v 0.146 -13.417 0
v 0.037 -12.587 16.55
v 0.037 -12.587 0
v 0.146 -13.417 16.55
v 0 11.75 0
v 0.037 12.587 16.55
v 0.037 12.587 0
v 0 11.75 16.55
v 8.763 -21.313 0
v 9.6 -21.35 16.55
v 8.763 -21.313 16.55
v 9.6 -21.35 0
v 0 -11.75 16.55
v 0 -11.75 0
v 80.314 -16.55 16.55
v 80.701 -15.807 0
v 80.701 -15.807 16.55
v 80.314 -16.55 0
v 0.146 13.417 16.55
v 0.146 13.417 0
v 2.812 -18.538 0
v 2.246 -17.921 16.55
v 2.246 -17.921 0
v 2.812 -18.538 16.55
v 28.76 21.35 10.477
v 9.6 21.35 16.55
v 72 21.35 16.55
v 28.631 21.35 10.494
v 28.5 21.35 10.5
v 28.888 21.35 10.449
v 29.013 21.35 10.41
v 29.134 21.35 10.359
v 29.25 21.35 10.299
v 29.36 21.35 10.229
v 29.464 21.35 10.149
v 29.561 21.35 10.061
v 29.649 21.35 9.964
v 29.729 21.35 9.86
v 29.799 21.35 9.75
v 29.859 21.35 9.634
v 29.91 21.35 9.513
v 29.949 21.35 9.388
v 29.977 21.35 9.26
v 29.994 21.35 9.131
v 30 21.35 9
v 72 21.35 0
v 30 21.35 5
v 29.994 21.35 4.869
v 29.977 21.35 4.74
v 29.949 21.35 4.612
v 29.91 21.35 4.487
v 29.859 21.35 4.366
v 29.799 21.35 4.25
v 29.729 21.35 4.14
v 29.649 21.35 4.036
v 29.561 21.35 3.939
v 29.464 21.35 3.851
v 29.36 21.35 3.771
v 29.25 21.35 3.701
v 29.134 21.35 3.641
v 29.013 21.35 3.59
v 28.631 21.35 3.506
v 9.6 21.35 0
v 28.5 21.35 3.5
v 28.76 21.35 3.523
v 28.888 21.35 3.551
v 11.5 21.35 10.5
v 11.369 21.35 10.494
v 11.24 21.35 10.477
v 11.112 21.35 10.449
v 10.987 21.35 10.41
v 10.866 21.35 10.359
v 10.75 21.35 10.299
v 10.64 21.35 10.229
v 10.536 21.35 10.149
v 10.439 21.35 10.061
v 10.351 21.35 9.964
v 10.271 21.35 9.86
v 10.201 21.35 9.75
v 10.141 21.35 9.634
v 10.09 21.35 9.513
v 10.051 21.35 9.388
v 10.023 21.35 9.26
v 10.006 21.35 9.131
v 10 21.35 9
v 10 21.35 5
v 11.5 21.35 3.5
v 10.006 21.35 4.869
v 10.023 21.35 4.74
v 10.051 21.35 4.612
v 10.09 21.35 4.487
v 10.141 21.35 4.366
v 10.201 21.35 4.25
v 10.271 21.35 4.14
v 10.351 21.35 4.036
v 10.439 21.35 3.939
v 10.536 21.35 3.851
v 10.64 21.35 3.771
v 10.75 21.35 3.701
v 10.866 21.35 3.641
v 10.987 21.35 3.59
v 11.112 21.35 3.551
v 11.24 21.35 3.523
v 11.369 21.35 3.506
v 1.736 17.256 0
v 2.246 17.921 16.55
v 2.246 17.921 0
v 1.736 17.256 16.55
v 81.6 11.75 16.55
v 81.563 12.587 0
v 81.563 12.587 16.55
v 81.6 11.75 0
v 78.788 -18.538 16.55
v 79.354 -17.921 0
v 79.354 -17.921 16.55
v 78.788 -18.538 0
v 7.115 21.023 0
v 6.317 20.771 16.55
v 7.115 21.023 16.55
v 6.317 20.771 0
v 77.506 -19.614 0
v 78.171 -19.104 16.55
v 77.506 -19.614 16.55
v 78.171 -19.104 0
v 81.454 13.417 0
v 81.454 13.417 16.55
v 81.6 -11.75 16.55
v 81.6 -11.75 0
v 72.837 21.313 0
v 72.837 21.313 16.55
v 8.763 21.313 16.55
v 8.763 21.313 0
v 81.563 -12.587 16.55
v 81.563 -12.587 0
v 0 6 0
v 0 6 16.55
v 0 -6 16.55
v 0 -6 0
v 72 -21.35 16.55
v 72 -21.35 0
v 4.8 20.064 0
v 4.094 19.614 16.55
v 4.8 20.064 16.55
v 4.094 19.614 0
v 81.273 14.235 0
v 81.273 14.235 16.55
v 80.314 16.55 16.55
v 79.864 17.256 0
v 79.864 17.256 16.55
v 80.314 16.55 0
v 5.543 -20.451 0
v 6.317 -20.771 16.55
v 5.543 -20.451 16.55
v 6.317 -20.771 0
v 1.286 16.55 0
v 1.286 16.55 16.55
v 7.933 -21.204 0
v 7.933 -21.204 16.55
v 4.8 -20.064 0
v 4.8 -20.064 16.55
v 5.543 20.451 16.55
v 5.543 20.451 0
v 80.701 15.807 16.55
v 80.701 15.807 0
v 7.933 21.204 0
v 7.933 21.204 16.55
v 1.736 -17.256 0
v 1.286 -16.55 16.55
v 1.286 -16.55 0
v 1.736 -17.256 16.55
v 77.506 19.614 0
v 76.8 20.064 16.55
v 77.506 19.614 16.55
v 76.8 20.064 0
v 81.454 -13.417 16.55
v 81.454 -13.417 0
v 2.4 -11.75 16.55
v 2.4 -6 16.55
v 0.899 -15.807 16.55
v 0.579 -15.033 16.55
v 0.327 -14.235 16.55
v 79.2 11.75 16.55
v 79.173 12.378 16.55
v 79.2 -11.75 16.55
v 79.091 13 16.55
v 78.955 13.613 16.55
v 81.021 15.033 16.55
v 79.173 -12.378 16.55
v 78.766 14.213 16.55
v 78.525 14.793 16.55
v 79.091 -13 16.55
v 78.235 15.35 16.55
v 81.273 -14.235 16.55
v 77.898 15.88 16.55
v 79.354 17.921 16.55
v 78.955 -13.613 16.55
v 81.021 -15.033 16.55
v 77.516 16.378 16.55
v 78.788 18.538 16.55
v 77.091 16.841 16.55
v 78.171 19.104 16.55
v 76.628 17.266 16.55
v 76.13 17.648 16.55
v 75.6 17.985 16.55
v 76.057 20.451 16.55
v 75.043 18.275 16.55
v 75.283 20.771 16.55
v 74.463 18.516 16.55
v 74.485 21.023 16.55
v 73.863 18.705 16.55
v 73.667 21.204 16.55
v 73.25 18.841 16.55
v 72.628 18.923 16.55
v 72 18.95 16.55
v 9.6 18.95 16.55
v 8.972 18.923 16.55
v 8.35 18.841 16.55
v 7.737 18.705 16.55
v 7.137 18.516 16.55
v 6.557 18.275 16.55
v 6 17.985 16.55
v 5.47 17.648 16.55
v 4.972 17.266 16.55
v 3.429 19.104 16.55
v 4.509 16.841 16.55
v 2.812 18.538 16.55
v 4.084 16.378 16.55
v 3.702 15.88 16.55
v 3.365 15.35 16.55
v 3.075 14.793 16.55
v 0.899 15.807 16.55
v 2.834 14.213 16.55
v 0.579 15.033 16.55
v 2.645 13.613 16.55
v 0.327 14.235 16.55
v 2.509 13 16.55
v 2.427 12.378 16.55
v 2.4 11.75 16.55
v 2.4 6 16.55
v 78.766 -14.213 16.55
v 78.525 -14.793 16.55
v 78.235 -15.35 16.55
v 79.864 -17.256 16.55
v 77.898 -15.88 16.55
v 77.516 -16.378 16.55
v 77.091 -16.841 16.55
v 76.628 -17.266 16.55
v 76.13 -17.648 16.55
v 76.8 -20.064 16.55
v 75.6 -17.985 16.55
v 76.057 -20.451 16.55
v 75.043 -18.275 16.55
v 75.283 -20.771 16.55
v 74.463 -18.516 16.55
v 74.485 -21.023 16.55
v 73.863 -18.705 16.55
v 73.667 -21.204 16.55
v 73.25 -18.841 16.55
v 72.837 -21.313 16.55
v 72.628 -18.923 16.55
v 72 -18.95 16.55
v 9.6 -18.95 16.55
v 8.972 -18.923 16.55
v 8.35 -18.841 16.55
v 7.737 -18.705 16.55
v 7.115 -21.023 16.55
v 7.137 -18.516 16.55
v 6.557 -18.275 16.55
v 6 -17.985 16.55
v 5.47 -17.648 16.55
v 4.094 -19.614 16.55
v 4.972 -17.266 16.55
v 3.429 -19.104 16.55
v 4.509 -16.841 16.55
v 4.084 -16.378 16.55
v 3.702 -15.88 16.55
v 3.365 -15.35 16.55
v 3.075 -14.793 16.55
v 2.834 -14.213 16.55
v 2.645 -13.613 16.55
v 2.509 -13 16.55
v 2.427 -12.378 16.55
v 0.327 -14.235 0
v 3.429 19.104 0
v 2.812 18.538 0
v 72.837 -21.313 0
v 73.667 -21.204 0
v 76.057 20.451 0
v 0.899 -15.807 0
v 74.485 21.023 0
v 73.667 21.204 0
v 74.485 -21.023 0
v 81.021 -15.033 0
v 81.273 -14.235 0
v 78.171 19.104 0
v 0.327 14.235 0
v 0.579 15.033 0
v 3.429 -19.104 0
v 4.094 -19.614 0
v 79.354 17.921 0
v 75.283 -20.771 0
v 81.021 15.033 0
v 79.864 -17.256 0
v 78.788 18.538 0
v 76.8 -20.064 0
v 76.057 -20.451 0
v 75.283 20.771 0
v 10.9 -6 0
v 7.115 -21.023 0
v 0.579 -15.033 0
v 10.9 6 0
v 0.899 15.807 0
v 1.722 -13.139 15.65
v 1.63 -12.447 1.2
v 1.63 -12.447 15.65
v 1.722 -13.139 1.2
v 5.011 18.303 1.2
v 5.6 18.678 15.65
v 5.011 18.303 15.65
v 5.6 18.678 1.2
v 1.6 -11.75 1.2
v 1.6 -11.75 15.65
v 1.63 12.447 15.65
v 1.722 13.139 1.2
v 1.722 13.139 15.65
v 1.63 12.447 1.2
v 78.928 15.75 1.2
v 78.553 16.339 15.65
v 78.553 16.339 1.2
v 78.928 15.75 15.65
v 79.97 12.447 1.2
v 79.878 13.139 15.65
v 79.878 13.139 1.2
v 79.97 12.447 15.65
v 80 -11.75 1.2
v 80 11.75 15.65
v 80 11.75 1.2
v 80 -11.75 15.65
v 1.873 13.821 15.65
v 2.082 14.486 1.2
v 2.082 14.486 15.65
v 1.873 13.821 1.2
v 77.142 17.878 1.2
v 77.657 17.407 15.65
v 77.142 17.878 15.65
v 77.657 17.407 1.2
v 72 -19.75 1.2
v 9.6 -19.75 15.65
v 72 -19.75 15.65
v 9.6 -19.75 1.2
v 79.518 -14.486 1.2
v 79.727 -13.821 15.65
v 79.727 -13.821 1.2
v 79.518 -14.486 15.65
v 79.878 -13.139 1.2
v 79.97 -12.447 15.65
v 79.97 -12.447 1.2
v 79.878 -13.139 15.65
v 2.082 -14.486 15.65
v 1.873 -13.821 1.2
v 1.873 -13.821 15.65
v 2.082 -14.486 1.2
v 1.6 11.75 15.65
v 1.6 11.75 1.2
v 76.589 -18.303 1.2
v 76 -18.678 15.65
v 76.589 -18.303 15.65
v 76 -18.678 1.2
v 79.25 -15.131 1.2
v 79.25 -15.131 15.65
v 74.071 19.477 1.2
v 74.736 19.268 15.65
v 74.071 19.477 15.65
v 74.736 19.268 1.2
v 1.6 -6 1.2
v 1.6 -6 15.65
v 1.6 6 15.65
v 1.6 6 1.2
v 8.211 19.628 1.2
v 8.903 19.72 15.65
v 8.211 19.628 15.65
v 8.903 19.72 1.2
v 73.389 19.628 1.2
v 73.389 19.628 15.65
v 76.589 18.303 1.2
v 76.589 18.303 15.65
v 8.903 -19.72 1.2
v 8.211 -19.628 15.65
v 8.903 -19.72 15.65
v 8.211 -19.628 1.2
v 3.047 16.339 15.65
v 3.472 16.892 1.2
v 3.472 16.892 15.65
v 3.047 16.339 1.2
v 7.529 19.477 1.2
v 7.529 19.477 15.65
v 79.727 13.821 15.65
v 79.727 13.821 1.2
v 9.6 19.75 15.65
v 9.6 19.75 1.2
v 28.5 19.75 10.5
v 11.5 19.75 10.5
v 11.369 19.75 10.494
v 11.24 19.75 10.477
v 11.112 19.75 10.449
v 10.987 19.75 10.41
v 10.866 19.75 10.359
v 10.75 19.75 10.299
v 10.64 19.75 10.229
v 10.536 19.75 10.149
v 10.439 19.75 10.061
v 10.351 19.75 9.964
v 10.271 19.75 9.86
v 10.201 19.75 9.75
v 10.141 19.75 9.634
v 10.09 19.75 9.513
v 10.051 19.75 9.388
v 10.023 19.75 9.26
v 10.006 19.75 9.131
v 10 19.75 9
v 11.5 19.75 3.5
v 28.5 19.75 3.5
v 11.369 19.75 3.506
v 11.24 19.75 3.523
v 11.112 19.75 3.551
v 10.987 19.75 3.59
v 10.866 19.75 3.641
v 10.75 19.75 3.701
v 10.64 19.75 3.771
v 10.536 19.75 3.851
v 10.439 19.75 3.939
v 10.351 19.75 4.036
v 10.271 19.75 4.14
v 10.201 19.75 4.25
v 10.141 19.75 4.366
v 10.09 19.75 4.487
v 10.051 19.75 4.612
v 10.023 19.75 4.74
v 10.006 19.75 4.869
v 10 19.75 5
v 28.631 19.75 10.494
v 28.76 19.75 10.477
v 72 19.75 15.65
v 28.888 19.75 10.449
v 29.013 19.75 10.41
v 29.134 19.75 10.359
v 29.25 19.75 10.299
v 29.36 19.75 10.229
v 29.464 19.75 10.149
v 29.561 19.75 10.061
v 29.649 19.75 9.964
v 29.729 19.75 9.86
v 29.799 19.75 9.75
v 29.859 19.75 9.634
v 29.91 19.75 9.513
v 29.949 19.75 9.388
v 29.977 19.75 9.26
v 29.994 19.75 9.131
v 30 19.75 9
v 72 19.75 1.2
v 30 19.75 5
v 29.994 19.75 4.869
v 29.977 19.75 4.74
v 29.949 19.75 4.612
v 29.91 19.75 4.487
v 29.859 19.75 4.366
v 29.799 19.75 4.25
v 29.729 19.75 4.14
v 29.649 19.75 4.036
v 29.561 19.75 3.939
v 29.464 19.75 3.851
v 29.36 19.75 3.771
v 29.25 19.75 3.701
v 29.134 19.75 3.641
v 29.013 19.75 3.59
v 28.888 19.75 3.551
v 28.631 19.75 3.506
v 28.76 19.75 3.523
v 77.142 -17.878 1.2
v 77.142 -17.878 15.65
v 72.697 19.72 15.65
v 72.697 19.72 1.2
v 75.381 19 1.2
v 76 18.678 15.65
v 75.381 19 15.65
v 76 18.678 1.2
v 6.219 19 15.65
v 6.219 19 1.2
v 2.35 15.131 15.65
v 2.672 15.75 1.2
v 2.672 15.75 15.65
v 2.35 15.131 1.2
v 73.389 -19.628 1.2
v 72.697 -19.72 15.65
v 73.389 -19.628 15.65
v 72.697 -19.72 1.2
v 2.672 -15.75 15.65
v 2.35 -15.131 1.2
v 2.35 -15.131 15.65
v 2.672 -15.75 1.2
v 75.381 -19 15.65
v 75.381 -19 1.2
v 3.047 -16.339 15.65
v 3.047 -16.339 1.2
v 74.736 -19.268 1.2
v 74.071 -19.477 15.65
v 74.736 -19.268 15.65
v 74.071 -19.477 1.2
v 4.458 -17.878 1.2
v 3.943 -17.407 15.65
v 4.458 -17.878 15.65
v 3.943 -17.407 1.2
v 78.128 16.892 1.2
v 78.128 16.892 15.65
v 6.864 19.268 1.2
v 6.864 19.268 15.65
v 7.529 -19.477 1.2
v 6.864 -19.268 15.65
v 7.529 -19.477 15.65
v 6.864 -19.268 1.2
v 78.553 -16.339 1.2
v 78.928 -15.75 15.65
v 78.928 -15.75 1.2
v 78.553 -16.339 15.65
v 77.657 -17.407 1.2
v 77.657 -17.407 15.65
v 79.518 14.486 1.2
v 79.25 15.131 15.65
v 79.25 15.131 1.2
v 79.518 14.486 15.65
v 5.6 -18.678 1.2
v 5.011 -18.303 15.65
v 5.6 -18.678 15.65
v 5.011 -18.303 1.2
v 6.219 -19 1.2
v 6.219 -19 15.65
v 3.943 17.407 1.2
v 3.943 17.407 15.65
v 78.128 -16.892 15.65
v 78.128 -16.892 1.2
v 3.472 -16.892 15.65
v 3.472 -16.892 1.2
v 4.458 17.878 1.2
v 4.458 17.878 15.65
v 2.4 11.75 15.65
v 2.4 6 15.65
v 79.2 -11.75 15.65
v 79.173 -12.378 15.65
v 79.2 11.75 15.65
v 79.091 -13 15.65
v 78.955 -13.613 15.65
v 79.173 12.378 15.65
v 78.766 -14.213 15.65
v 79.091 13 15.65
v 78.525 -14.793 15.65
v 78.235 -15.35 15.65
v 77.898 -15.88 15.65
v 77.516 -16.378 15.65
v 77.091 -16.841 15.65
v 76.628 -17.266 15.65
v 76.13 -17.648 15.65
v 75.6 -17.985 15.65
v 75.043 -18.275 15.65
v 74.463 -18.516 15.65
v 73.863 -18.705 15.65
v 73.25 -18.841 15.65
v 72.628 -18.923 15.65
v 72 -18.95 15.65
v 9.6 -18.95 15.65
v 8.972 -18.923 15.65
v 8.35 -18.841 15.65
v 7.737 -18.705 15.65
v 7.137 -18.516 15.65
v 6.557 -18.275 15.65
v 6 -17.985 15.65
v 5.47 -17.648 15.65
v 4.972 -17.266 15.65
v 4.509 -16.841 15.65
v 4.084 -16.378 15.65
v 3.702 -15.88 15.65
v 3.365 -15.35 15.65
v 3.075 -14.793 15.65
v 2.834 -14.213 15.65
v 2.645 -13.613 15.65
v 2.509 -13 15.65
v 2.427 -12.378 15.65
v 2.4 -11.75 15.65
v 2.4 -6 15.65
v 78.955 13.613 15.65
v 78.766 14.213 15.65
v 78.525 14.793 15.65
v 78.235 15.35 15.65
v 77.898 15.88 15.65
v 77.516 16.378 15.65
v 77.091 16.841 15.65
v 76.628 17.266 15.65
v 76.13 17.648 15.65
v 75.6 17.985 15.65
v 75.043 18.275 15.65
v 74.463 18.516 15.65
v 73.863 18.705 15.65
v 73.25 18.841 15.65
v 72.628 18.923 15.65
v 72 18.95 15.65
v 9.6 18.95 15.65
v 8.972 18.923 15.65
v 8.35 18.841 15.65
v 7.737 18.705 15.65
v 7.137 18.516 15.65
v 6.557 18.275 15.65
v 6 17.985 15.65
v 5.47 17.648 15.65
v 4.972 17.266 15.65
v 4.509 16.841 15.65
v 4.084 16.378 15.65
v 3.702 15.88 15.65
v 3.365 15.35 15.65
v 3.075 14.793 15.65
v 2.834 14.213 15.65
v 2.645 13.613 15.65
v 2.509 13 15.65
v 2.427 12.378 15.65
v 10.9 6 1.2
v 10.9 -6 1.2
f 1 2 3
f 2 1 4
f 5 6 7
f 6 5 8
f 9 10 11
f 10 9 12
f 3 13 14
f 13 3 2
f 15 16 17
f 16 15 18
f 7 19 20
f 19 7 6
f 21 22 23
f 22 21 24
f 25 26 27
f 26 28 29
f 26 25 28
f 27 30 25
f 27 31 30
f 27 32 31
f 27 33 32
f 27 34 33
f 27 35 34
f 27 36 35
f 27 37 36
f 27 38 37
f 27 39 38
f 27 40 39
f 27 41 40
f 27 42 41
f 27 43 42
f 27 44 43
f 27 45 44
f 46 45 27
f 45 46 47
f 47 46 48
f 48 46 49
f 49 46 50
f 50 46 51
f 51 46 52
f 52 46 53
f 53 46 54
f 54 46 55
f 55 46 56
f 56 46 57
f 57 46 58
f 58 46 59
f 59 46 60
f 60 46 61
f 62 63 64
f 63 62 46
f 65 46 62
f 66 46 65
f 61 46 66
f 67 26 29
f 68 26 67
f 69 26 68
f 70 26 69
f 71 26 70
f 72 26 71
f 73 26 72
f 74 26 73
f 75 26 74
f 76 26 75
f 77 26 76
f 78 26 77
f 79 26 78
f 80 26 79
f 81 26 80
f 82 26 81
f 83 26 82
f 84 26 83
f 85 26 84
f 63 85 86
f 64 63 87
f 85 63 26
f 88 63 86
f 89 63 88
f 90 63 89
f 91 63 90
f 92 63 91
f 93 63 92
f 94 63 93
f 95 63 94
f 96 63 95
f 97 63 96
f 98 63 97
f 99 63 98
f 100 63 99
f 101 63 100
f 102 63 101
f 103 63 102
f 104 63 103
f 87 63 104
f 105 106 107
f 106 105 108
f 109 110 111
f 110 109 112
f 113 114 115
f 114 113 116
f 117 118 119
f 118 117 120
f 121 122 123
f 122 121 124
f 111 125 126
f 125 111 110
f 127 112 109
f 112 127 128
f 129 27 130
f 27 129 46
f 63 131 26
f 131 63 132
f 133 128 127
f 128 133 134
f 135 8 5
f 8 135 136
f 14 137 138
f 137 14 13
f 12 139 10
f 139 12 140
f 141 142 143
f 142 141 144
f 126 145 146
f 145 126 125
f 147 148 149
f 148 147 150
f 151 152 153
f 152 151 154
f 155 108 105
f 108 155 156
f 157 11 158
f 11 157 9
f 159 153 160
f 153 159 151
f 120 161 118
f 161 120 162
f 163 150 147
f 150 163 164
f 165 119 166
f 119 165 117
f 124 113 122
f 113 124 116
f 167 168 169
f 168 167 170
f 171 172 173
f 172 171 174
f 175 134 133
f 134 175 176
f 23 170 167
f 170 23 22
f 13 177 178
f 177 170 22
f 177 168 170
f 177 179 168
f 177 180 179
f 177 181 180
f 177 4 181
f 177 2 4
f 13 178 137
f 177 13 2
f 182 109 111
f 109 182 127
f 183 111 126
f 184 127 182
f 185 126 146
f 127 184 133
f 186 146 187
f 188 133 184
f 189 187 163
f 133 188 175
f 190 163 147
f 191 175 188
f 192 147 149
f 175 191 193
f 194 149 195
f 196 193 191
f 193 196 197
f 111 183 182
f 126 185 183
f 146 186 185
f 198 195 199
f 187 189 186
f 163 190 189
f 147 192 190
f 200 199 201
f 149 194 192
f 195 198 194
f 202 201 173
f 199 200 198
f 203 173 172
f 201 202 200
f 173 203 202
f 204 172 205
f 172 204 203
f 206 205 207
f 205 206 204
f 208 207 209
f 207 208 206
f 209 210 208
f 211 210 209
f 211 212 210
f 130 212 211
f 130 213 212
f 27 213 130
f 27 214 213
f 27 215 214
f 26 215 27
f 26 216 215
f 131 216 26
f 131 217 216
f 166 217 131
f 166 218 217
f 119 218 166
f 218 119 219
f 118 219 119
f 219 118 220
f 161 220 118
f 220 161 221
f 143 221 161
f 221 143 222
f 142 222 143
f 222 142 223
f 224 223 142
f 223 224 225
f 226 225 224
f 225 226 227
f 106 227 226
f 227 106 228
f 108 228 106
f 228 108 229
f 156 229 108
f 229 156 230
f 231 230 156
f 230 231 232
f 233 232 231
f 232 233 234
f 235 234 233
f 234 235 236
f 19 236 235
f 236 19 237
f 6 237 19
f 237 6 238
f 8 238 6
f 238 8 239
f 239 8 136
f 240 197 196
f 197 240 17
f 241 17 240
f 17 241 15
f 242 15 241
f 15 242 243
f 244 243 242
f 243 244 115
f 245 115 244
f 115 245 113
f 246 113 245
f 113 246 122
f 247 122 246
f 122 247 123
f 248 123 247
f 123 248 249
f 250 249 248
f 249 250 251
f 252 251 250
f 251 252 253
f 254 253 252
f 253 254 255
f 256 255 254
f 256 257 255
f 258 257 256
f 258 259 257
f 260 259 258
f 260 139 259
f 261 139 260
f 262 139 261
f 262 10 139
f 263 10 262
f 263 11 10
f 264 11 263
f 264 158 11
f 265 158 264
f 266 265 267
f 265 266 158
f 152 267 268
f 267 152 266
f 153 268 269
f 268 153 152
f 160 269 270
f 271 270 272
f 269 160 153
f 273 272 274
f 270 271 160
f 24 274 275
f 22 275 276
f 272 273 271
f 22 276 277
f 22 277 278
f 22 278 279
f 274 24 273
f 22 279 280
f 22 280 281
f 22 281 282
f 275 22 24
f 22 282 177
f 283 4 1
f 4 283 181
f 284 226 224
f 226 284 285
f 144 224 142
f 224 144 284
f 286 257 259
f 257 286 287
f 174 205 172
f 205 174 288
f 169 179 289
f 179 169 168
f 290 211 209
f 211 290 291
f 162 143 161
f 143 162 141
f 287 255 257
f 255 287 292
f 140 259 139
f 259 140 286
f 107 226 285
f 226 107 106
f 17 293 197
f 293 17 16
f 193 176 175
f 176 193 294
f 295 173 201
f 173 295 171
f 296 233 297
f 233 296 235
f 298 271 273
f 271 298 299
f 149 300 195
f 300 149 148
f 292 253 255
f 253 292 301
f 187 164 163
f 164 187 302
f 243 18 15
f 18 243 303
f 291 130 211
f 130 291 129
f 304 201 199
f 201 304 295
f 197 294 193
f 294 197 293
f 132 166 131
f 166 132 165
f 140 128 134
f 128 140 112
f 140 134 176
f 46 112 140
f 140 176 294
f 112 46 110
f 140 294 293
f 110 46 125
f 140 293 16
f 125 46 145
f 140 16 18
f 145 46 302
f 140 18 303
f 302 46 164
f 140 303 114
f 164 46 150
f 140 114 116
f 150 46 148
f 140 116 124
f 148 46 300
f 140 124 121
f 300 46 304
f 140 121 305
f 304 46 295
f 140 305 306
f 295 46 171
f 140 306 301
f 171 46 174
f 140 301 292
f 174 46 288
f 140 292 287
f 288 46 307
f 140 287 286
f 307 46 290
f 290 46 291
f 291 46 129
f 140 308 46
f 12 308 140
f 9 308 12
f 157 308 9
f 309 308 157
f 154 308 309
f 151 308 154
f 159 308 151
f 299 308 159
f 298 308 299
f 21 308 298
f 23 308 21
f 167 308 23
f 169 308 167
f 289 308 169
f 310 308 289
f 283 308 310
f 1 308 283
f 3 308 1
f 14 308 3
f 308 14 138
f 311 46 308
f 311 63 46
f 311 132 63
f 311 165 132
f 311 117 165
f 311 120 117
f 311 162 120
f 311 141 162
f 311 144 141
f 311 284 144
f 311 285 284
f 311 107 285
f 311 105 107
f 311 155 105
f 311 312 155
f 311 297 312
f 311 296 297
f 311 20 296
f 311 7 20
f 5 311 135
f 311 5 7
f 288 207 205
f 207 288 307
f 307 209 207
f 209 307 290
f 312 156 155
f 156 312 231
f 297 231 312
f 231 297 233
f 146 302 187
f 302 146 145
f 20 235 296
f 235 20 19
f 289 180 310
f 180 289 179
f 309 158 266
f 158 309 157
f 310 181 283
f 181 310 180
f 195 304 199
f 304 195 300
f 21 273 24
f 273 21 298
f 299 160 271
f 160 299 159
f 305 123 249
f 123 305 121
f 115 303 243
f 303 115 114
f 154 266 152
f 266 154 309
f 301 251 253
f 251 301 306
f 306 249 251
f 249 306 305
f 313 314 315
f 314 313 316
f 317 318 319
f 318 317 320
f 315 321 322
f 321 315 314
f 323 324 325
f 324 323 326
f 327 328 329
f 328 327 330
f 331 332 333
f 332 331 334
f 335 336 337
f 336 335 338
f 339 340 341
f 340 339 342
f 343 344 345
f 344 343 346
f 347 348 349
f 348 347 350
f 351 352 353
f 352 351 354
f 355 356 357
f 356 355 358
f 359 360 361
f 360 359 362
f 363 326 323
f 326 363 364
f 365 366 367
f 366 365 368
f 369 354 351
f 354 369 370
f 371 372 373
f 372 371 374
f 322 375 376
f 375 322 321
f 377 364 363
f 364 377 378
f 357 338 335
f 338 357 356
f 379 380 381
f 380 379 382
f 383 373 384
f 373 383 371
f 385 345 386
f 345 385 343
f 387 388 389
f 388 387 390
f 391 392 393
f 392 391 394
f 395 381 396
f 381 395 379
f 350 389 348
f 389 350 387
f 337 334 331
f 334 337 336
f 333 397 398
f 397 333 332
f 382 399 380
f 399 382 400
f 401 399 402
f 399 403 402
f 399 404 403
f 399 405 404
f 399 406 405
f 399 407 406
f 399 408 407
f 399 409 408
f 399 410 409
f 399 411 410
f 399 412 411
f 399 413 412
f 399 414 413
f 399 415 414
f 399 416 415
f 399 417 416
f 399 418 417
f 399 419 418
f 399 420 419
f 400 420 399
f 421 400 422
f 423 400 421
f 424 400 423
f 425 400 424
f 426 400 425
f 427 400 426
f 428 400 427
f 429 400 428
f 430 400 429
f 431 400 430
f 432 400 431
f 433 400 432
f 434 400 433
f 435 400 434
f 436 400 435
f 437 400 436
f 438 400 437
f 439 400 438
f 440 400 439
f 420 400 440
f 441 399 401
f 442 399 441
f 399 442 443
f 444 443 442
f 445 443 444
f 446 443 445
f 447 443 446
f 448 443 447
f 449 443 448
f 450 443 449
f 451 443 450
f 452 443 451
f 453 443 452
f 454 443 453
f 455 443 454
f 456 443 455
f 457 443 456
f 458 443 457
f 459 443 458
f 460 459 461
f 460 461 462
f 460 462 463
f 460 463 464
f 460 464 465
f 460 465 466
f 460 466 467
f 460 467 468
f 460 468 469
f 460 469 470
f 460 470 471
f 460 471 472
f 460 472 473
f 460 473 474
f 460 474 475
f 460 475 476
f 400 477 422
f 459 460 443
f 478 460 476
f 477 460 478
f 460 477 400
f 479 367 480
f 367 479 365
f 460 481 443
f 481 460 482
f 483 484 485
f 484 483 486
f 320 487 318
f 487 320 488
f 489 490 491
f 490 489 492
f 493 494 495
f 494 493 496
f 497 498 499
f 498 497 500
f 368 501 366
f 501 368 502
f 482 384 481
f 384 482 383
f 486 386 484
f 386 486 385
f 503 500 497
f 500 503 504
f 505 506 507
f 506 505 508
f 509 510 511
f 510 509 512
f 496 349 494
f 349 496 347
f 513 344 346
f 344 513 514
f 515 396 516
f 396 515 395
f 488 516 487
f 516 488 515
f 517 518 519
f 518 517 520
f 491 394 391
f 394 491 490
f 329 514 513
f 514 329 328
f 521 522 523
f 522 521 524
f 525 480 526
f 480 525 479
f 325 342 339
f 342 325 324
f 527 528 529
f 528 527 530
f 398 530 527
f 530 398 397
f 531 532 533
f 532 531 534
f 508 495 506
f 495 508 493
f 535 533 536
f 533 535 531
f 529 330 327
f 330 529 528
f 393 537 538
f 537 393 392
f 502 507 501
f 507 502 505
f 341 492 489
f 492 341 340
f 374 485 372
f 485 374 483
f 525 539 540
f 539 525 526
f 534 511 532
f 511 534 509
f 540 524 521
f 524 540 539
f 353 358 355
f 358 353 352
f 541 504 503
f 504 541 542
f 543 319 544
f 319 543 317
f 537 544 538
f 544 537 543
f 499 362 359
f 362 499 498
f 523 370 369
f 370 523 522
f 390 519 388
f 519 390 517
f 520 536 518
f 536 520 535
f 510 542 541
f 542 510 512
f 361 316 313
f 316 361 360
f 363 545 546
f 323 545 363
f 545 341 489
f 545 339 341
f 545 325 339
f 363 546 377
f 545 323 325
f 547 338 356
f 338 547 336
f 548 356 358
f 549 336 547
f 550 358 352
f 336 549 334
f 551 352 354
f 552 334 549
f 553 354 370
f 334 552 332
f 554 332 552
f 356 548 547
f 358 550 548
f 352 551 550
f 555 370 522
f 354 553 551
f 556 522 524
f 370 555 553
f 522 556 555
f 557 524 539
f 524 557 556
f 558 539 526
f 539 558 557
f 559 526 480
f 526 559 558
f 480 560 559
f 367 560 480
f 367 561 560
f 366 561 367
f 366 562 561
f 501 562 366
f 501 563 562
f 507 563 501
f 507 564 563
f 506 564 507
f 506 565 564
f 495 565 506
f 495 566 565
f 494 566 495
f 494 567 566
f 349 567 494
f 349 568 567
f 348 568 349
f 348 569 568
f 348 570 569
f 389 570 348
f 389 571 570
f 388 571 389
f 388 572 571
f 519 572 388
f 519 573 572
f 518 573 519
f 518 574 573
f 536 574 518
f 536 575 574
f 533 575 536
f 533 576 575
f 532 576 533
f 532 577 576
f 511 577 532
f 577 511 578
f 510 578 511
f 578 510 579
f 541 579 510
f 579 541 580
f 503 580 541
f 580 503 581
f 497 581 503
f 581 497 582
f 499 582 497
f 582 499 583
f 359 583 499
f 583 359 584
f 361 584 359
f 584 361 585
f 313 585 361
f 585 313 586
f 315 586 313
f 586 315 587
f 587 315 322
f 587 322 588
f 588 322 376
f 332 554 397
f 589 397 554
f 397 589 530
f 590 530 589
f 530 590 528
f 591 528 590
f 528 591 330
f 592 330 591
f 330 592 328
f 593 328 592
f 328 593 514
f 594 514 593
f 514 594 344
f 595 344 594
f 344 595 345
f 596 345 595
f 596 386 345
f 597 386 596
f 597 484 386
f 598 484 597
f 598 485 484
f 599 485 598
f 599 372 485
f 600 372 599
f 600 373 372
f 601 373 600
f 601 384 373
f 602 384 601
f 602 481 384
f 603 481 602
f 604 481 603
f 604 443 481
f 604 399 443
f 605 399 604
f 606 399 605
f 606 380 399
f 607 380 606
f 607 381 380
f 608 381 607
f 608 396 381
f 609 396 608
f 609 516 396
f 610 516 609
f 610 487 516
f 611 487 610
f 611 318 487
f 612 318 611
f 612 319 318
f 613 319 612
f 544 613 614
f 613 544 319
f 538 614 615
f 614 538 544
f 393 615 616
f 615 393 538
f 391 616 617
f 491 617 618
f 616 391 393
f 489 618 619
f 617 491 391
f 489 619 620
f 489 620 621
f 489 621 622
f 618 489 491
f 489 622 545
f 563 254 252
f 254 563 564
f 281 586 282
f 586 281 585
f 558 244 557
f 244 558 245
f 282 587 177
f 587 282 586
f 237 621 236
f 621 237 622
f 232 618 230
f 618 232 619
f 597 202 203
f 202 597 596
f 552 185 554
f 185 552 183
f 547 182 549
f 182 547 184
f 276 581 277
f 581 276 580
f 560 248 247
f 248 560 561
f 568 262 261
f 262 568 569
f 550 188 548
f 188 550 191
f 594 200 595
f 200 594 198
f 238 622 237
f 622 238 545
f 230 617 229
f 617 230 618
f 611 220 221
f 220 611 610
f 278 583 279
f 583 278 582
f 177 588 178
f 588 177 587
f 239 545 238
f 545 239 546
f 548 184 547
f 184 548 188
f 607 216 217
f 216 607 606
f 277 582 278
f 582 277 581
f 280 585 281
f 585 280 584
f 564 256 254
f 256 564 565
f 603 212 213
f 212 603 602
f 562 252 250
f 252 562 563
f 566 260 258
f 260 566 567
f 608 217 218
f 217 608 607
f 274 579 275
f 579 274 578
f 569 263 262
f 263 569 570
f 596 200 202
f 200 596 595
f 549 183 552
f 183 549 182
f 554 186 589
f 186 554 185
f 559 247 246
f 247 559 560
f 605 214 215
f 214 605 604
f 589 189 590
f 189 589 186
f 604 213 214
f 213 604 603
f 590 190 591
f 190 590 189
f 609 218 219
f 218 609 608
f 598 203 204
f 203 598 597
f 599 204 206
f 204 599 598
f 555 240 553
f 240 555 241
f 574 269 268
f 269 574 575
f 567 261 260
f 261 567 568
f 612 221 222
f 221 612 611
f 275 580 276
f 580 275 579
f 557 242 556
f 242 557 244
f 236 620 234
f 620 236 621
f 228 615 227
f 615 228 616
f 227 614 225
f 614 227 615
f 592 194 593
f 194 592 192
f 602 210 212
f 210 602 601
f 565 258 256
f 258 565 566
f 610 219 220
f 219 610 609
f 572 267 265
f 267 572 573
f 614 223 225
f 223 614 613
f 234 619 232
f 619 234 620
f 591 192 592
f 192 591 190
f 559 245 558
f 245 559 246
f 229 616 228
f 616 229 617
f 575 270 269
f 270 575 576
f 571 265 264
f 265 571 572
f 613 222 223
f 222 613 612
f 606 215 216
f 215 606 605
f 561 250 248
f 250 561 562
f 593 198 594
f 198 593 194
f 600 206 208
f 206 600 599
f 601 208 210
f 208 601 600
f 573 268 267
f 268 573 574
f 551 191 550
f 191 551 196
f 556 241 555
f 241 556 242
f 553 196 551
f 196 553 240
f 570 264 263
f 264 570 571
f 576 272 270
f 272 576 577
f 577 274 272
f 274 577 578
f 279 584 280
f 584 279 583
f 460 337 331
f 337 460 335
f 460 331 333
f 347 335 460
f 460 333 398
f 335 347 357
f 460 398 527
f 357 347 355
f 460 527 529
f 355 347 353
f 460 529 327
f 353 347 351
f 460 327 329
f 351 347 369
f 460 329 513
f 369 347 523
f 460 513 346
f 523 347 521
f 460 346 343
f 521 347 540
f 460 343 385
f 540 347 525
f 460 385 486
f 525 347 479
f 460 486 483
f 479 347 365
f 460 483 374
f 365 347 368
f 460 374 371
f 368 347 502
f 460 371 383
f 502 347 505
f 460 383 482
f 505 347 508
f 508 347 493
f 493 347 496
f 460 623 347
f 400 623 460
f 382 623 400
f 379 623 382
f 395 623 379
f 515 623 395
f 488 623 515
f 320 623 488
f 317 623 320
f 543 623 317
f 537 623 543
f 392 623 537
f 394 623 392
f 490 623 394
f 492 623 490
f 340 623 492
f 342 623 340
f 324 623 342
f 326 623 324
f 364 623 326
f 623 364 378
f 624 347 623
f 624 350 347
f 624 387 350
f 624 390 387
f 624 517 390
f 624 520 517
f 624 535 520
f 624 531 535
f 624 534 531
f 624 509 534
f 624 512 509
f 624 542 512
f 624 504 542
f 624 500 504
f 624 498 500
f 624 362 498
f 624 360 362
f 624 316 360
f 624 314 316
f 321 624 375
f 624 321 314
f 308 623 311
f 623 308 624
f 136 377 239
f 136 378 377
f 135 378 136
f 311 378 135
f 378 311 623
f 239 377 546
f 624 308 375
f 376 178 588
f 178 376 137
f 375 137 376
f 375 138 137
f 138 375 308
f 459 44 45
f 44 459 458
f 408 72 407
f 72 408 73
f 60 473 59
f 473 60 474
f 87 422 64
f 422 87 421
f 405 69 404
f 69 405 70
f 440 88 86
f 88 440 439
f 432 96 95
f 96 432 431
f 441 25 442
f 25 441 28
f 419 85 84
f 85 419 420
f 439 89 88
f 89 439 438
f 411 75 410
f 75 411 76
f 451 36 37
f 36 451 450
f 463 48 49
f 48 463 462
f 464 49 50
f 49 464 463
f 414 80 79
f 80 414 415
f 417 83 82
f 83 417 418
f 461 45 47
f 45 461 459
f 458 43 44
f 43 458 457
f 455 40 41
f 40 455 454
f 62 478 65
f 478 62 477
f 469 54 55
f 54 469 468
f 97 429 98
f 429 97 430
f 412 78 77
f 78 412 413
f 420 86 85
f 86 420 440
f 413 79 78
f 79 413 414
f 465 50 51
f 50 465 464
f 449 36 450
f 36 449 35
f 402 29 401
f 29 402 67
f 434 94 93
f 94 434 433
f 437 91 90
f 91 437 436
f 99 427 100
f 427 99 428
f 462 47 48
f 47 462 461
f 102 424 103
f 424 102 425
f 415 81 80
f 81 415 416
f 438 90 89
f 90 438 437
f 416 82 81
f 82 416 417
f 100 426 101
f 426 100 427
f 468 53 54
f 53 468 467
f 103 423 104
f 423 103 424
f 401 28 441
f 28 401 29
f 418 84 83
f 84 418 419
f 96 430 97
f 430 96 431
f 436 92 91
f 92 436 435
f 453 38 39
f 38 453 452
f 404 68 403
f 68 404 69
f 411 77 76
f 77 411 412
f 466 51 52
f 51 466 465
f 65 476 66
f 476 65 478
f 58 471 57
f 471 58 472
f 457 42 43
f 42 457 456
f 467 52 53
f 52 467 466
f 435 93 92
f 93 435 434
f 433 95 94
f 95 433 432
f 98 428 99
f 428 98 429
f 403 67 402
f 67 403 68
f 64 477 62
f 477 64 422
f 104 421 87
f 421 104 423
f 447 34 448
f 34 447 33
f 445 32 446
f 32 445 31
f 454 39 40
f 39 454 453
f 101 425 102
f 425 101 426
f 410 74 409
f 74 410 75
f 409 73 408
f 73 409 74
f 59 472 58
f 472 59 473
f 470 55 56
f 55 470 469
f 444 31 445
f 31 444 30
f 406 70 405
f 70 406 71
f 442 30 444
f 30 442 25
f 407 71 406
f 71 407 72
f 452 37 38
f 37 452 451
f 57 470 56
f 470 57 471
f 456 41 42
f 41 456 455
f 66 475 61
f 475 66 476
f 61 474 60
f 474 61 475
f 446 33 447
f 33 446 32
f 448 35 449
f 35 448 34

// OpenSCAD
// GEELY EX2 — BUMPER TPU COM SLOT LATERAL PARA LÂMINA CANIVETE
// V0.2 PARAMÉTRICA
// Protege traseira e laterais; face dos botões aberta.
// O slot lateral é uma janela simples no plano X/Z: ajuste posição, largura e altura.
// Eixos: X = comprimento (argola -> topo), Y = largura, Z = espessura.
//
// IMPORTANTE: as dimensões da chave são preliminares e não oficiais.
// Medir a chave física antes de imprimir a peça completa.

$fn = 72;

// ===================== MEDIDAS DA CHAVE =====================
KEY_L = 78.0;       // comprimento do corpo da chave, eixo X, mm
KEY_W = 39.0;       // largura máxima, eixo Y, mm
KEY_T = 16.0;       // espessura máxima, eixo Z, mm
KEY_R = 8.0;        // raio aproximado dos cantos em planta, mm

// ===================== FOLGAS / PAREDES TPU =====================
CLR_X = 0.40;       // folga interna em X
CLR_Y = 0.25;       // folga interna por lado em Y
CLR_Z = 0.35;       // folga interna em Z
BACK = 1.20;        // base traseira
SIDE_WALL = 1.60;   // parede lateral
FACE_CLEARANCE = 1.00; // parede termina abaixo da face da chave
LIP_IN = 0.80;      // ressalto interno de retenção
LIP_H = 0.90;       // altura do ressalto

// ===================== ARGOLA =====================
RING_NOTCH_L = 11.0;
RING_NOTCH_W = 12.0;

// ===================== SLOT DA LÂMINA CANIVETE =====================
BLADE_SLOT_ENABLE = true;
BLADE_SLOT_SIDE = 1;       // +1 = parede Y positiva; -1 = parede Y negativa
BLADE_SLOT_X = 20.0;        // centro da janela ao longo de X
BLADE_SLOT_W = 20.0;        // largura/comprimento da janela em X
BLADE_SLOT_Z = 7.0;         // centro da janela em Z, medido a partir da base
BLADE_SLOT_H = 7.0;         // altura da janela em Z
BLADE_SLOT_R = 1.5;         // raio dos cantos da janela

// Para uma lâmina que deve ser aberta com a capa instalada, comece com
// BLADE_SLOT_W = 20–25 mm e BLADE_SLOT_H = 7–9 mm.
// Ajuste somente após confirmar a dobradiça e o botão de liberação.

// ===================== DIMENSÕES DERIVADAS =====================
INNER_L = KEY_L + CLR_X;
INNER_W = KEY_W + 2*CLR_Y;
INNER_T = KEY_T + CLR_Z;
OUTER_L = INNER_L + 2*SIDE_WALL;
OUTER_W = INNER_W + 2*SIDE_WALL;
WALL_H = max(1.0, INNER_T - FACE_CLEARANCE);
OUTER_H = BACK + WALL_H;
OUTER_R = min(KEY_R + SIDE_WALL, OUTER_W/2 - 0.30);
INNER_R = min(KEY_R, INNER_W/2 - 0.30);

// ===================== PRIMITIVAS =====================
module rounded2d(l, w, r) {
    hull() {
        for (x = [r, l-r])
            for (y = [-w/2+r, w/2-r])
                translate([x, y]) circle(r=r);
    }
}

module rounded_rect_centered_2d(w, h, r) {
    hull() {
        for (x = [-w/2+r, w/2-r])
            for (y = [-h/2+r, h/2-r])
                translate([x, y]) circle(r=r);
    }
}

module rounded_prism(l, w, h, r) {
    linear_extrude(height=h) rounded2d(l, w, r);
}

// Janela arredondada no plano X/Z, extrudida através da parede Y.
module rounded_slot_xz(w, h, r, depth) {
    rotate([90,0,0])
        linear_extrude(height=depth, center=true)
            rounded_rect_centered_2d(w, h, r);
}

module base_plate() {
    rounded_prism(OUTER_L, OUTER_W, BACK, OUTER_R);
}

module side_ring() {
    difference() {
        rounded_prism(OUTER_L, OUTER_W, OUTER_H, OUTER_R);
        translate([SIDE_WALL, 0, BACK-0.05])
            rounded_prism(INNER_L, INNER_W, WALL_H+0.20, INNER_R);
    }
}

module retention_lip() {
    difference() {
        translate([0, 0, BACK+WALL_H-LIP_H])
            rounded_prism(OUTER_L, OUTER_W, LIP_H, OUTER_R);
        translate([SIDE_WALL+LIP_IN, 0, BACK+WALL_H-LIP_H-0.05])
            rounded_prism(INNER_L-2*LIP_IN, INNER_W-2*LIP_IN,
                          LIP_H+0.20, max(0.5, INNER_R-LIP_IN));
    }
}

module ring_notch() {
    translate([-0.10, -RING_NOTCH_W/2, -0.10])
        cube([RING_NOTCH_L, RING_NOTCH_W, OUTER_H+0.30]);
}

module blade_slot() {
    if (BLADE_SLOT_ENABLE) {
        slot_y = BLADE_SLOT_SIDE > 0
            ? OUTER_W/2 - SIDE_WALL/2
            : -OUTER_W/2 + SIDE_WALL/2;
        translate([BLADE_SLOT_X, slot_y, BLADE_SLOT_Z])
            rounded_slot_xz(BLADE_SLOT_W, BLADE_SLOT_H, BLADE_SLOT_R,
                            SIDE_WALL+0.40);
    }
}

module bumper() {
    difference() {
        union() {
            base_plate();
            side_ring();
            retention_lip();
        }
        ring_notch();
        blade_slot();
    }
}

bumper();

// ===================== AJUSTE RÁPIDO =====================
// 1. Meça a posição central da dobradiça/botão em X e Z.
// 2. Ajuste BLADE_SLOT_X para deslocar a janela ao longo da chave.
// 3. Ajuste BLADE_SLOT_W para aumentar/reduzir a largura em X.
// 4. Ajuste BLADE_SLOT_H para aumentar/reduzir a altura em Z.
// 5. Use BLADE_SLOT_SIDE = -1 se a lâmina estiver na outra lateral.
// 6. Mantenha BLADE_SLOT_R >= 1.5 mm para reduzir rasgos no TPU.
// 7. Imprima primeiro um trecho de 10–15 mm ou uma amostra da região do slot.
